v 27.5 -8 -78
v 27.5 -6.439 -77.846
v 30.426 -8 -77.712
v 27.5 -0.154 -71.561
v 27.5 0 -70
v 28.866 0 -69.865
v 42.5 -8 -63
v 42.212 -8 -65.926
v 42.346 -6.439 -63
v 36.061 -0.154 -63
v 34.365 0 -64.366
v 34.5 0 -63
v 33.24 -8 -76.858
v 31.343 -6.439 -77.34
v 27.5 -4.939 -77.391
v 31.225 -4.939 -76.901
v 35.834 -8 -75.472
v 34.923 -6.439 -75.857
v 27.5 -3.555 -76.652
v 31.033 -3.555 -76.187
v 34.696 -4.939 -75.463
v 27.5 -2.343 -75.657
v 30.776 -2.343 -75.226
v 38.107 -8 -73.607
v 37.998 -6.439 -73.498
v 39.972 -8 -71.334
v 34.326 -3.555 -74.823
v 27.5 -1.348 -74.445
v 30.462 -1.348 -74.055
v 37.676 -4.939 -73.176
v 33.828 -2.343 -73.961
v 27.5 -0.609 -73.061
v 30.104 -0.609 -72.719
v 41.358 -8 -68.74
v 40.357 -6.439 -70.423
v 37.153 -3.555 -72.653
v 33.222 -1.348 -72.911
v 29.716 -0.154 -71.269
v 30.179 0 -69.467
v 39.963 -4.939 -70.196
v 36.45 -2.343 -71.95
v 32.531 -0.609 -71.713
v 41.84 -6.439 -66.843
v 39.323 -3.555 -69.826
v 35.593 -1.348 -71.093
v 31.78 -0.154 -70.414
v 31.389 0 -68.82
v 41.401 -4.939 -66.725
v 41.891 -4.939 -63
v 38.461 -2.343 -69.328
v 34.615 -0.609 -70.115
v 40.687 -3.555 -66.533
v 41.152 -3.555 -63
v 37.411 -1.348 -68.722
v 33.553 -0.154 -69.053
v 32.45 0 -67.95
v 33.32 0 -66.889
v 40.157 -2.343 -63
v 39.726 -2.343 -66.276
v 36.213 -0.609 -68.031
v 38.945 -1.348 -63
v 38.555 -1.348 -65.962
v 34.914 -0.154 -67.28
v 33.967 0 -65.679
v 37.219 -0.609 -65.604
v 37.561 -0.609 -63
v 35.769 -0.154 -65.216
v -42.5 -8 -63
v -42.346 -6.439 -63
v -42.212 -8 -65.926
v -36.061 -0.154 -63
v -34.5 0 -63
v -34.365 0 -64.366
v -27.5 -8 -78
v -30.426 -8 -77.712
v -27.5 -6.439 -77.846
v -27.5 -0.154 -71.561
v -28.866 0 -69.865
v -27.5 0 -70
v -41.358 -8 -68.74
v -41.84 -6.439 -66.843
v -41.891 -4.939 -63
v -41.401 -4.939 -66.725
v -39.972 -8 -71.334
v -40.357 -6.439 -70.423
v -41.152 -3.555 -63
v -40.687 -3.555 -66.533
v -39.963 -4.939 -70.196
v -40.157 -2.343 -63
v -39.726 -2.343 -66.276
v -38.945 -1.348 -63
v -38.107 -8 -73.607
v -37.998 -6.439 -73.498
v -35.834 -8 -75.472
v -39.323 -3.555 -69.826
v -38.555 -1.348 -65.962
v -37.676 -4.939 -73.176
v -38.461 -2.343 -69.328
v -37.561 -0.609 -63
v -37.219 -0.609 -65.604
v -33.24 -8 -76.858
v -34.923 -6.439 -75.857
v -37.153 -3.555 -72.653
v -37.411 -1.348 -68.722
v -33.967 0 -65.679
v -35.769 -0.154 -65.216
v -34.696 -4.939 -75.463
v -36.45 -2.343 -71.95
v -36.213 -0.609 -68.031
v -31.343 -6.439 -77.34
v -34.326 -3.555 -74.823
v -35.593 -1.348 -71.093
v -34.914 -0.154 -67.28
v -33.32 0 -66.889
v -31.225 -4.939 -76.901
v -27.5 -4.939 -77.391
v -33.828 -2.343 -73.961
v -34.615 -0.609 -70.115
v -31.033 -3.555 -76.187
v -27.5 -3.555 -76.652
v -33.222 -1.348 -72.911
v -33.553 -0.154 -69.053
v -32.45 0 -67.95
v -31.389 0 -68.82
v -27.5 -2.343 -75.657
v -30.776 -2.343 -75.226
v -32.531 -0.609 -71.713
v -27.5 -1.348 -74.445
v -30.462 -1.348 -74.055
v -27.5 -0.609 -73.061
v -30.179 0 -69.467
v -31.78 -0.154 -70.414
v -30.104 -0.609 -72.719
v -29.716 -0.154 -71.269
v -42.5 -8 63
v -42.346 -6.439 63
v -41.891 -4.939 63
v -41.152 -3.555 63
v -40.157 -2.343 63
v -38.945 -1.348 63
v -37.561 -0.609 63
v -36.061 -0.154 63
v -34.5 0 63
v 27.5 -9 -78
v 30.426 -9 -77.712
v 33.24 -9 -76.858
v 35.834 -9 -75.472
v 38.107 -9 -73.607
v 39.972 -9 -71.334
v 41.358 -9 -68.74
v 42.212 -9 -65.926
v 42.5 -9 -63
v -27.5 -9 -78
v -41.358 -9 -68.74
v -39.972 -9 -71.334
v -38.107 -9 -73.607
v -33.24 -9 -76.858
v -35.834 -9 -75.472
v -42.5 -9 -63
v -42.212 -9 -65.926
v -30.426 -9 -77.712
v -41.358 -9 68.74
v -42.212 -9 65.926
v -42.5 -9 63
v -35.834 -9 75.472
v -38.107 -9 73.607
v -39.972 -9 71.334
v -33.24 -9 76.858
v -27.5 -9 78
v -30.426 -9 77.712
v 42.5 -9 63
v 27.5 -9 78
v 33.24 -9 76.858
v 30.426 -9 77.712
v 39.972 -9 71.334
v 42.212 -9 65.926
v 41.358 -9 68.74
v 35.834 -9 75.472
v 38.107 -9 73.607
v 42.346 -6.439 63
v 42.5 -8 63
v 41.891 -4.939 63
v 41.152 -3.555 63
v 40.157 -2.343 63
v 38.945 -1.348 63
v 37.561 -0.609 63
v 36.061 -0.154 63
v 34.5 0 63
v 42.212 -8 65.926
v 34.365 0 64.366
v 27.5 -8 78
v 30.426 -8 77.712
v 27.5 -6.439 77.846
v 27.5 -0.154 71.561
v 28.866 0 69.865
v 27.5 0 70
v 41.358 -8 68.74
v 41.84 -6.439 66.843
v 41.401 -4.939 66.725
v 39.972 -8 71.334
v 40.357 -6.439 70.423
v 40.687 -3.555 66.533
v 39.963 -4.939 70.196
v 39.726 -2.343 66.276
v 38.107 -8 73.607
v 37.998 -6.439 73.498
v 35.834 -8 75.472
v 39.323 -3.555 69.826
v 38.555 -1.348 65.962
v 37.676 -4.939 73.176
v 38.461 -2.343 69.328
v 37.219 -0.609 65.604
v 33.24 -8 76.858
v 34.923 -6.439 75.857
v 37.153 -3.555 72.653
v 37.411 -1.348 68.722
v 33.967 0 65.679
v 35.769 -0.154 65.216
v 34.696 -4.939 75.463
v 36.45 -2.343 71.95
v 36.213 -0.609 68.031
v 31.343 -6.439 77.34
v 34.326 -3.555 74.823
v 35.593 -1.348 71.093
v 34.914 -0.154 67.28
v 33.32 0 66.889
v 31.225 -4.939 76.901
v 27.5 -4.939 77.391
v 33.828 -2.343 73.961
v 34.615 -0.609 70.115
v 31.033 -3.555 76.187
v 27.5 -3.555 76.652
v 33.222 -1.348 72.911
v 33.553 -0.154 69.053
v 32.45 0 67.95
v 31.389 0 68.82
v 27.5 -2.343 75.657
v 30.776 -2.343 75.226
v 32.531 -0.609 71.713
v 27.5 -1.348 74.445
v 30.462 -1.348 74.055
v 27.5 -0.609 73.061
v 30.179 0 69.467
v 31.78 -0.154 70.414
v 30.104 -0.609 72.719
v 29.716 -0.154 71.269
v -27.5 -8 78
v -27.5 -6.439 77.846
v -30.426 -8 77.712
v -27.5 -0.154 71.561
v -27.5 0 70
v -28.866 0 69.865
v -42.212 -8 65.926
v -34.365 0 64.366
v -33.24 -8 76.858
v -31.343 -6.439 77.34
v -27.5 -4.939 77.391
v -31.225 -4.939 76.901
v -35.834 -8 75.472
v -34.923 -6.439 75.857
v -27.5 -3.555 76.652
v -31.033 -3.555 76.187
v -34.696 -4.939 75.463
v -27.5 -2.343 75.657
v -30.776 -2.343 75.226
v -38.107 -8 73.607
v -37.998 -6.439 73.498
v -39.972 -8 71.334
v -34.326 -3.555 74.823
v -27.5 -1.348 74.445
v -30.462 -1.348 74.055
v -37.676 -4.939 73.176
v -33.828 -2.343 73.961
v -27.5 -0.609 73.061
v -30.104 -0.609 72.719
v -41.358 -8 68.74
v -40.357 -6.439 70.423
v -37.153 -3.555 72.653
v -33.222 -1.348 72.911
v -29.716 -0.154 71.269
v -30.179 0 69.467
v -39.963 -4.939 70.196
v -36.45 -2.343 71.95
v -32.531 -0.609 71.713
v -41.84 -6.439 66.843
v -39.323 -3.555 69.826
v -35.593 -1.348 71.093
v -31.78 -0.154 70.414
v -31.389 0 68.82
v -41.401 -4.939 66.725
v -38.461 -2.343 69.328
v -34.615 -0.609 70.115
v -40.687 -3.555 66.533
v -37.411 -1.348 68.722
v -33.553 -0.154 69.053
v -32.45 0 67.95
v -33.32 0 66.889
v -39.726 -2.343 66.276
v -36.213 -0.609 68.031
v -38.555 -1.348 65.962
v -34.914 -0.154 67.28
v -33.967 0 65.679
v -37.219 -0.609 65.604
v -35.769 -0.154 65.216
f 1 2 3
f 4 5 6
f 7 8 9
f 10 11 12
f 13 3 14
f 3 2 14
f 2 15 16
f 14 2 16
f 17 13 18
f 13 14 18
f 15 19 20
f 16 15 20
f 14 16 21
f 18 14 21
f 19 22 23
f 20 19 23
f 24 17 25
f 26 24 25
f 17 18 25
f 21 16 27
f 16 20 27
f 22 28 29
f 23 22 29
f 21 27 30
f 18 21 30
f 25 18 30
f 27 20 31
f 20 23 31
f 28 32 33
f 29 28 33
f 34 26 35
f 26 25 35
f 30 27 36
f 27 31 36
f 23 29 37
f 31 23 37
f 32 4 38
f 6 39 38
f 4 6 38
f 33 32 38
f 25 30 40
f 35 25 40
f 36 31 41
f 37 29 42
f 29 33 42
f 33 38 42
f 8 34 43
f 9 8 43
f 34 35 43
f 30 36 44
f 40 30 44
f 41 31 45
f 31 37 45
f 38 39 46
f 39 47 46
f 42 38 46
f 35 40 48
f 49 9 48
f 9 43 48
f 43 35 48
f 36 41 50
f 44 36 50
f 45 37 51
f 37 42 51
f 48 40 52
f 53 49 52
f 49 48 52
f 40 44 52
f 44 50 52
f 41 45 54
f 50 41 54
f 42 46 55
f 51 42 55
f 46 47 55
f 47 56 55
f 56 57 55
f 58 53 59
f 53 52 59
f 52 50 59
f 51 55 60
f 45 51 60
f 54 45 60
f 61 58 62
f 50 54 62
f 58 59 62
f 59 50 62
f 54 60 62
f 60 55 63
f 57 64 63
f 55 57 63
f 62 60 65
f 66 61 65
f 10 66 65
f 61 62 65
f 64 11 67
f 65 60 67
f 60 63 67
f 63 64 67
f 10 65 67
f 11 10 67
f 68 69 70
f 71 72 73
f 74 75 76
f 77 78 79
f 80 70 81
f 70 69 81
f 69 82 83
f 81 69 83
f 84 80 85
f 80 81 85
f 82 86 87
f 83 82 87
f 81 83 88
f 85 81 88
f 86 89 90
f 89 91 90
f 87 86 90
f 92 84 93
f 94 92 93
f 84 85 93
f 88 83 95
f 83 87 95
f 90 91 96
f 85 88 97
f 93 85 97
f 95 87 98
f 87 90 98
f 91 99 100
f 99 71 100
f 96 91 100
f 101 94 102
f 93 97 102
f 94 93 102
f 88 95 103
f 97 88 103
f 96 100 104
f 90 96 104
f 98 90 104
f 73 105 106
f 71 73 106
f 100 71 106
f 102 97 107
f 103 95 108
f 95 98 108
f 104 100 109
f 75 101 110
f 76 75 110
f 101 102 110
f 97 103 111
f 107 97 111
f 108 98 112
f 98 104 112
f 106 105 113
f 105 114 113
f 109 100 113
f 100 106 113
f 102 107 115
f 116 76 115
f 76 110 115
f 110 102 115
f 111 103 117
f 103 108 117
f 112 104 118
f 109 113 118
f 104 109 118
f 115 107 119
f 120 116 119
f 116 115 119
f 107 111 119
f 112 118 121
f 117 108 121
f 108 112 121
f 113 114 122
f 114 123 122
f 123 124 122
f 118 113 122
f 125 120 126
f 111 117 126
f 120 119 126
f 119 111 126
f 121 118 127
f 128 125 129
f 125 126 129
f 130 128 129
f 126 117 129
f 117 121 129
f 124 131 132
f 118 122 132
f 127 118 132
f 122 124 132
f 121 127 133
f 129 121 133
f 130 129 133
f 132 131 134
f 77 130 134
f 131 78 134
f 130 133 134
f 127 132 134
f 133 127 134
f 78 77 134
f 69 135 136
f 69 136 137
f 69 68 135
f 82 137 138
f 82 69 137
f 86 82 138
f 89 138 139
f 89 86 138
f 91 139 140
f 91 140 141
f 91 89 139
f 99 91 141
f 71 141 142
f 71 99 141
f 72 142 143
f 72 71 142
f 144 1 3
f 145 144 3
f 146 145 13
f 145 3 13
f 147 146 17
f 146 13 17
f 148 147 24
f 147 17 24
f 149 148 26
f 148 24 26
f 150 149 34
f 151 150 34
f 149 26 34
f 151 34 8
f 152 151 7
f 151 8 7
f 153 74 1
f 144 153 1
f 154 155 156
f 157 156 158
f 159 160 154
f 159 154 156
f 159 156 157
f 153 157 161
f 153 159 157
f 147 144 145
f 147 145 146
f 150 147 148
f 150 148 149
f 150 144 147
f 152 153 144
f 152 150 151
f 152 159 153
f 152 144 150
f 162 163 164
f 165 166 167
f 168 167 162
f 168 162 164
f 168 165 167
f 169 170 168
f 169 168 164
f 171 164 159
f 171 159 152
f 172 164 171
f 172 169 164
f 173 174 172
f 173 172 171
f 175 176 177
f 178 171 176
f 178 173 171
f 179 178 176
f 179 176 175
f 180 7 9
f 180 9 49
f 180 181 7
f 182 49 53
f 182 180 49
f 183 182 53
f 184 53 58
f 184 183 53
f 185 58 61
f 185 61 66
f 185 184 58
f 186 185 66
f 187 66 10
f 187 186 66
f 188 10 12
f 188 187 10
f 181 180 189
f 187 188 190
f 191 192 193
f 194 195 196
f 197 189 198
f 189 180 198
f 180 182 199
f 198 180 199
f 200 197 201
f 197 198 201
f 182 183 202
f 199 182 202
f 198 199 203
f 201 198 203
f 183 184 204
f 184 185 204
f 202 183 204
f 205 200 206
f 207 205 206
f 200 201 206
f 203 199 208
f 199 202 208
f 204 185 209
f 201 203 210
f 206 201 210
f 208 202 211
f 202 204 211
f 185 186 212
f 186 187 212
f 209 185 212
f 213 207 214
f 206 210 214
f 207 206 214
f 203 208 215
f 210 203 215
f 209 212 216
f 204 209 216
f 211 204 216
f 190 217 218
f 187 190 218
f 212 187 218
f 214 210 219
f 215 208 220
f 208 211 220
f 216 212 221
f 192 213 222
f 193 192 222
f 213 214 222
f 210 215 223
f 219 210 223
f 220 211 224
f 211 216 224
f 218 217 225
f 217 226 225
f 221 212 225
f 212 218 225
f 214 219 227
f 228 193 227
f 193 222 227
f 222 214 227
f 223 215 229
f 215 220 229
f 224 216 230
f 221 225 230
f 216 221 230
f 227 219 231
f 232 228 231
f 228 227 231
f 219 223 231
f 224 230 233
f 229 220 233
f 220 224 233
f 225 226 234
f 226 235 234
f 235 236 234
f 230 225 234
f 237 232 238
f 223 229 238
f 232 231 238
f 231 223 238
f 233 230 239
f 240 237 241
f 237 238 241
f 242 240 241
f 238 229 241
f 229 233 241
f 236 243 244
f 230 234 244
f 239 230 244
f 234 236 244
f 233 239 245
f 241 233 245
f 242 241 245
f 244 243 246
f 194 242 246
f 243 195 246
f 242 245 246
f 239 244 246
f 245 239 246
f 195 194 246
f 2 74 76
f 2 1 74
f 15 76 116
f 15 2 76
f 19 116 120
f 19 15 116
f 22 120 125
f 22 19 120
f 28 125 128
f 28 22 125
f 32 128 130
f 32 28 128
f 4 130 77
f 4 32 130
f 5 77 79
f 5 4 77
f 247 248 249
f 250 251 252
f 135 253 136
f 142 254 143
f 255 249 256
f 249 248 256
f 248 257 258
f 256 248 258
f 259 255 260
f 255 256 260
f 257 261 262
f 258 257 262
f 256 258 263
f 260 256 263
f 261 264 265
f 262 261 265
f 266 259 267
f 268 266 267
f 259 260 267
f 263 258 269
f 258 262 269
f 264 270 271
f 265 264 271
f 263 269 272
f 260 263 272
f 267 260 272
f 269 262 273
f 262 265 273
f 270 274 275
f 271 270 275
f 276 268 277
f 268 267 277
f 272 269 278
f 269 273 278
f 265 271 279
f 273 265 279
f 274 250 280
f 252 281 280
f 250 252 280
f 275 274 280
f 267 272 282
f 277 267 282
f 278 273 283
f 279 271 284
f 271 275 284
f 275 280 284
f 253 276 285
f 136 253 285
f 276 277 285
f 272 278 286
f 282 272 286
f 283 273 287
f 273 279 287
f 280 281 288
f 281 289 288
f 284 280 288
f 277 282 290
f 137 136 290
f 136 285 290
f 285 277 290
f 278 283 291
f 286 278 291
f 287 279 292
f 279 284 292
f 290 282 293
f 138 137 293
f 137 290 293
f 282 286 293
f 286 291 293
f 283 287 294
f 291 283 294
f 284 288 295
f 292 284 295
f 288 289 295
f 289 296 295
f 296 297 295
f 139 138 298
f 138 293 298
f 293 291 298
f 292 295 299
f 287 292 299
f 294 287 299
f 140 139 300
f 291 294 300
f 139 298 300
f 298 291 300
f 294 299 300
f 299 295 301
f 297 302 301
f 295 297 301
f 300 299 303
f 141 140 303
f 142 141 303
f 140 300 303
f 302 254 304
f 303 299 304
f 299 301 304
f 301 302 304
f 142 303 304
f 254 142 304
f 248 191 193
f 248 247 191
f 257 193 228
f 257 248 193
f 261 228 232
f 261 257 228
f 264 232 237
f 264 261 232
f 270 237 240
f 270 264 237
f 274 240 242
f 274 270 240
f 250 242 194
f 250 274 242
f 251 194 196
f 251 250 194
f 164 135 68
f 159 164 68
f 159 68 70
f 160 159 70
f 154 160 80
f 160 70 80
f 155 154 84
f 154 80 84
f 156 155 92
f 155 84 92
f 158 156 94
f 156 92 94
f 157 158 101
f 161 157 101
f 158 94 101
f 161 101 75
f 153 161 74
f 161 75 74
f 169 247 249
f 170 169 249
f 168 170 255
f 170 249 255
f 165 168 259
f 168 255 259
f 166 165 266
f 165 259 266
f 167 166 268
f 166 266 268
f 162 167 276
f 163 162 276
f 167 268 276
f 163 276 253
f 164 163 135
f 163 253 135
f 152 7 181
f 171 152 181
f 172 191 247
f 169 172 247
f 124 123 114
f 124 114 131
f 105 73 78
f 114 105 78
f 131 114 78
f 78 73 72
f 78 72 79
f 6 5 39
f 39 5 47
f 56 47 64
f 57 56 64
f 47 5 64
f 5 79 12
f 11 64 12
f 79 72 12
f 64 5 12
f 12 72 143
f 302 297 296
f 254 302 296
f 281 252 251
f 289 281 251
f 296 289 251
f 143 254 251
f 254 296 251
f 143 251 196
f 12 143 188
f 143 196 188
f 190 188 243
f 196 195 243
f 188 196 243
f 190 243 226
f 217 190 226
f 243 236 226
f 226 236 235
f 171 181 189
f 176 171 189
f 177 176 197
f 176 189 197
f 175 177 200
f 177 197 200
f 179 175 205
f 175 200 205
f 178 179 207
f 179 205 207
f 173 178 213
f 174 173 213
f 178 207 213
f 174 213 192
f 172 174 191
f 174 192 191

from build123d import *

# Parameters (mm, degrees)
F1_DEPTH = 9
F2_R     = 8


with BuildPart() as f1:
    # F0 (on Front) → F1 (new body)
    with BuildSketch(Plane.XZ):
        with BuildLine():
            ThreePointArc((-42.5, -63), (-38.106602, -73.606602), (-27.5, -78))
            Line((-27.5, -78), (27.5, -78))
            ThreePointArc((27.5, -78), (38.106602, -73.606602), (42.5, -63))
            Line((42.5, -63), (42.5, 63))
            ThreePointArc((42.5, 63), (38.106602, 73.606602), (27.5, 78))
            Line((27.5, 78), (-27.5, 78))
            ThreePointArc((-27.5, 78), (-38.106602, 73.606602), (-42.5, 63))
            Line((-42.5, 63), (-42.5, -63))
        make_face()
    extrude(amount=F1_DEPTH)

    # F2
    f2_edges = [f1.edges().sort_by_distance(p)[0] for p in [
        (-38.106602, 0, -73.606602),
        (0, 0, -78),
        (38.106602, 0, -73.606602),
        (42.5, 0, 0),
        (38.106602, 0, 73.606602),
        (0, 0, 78),
        (-38.106602, 0, 73.606602),
        (-42.5, 0, 0),
    ]]
    fillet(f2_edges, radius=F2_R)


solid = f1.part
